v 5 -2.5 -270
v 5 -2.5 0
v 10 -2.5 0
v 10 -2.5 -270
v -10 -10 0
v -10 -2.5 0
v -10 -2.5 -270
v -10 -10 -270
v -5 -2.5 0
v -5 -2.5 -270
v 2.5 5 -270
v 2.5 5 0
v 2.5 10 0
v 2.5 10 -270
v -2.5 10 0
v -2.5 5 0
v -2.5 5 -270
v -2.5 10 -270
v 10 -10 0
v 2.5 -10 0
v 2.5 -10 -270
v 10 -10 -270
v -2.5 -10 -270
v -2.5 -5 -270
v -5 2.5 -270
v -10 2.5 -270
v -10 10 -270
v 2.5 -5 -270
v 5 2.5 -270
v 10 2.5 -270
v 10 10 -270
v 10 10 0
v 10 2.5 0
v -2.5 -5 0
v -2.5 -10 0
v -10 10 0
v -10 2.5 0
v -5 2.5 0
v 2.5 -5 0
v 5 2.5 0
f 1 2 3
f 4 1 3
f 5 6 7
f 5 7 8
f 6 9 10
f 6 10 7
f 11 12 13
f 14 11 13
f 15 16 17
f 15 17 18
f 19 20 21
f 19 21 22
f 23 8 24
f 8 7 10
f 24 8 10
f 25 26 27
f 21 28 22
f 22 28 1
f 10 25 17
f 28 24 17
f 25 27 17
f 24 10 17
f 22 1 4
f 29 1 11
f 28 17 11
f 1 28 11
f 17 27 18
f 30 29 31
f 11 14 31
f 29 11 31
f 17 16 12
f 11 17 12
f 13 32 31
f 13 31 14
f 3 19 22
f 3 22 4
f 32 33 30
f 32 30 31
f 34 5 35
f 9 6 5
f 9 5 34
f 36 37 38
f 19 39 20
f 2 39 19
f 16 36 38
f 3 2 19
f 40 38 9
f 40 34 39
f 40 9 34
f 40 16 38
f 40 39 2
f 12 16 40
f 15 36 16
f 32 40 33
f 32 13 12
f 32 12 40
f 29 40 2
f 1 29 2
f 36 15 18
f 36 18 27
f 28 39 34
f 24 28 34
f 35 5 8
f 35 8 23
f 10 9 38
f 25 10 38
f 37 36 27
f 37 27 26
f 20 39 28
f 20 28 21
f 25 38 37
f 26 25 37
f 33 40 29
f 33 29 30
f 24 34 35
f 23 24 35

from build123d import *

# Parameters (mm, degrees)
SKETCH1_W           = 20
SKETCH1_H           = 20
BOSS_EXTRUDE1_DEPTH = 270
SKETCH1_3_W         = 5
SKETCH1_3_H         = 10
CUT_EXTRUDE1_DEPTH  = 645
CIRPATTERN1_COUNT   = 4


with BuildPart() as part:
    # Sketch1 → Boss-Extrude1 (new body)
    with BuildSketch(Plane.XY):
        Rectangle(SKETCH1_W, SKETCH1_H)
    extrude(amount=-BOSS_EXTRUDE1_DEPTH)

    # Sketch1<3> → Cut-Extrude1 (cut)
    with BuildSketch(Plane.XY):
        with Locations((0, 10)):
            Rectangle(SKETCH1_3_W, SKETCH1_3_H)
    cut_extrude1 = extrude(amount=-CUT_EXTRUDE1_DEPTH, mode=Mode.SUBTRACT)

    # CirPattern1: Cut-Extrude1 ×4 about axis
    cirpattern1_axis = Axis((0, 0, 32.25), (0, 0, -1))
    for i in range(1, CIRPATTERN1_COUNT):
        add(cut_extrude1.rotate(cirpattern1_axis, i * 360 / CIRPATTERN1_COUNT), mode=Mode.SUBTRACT)


solid = part.part
